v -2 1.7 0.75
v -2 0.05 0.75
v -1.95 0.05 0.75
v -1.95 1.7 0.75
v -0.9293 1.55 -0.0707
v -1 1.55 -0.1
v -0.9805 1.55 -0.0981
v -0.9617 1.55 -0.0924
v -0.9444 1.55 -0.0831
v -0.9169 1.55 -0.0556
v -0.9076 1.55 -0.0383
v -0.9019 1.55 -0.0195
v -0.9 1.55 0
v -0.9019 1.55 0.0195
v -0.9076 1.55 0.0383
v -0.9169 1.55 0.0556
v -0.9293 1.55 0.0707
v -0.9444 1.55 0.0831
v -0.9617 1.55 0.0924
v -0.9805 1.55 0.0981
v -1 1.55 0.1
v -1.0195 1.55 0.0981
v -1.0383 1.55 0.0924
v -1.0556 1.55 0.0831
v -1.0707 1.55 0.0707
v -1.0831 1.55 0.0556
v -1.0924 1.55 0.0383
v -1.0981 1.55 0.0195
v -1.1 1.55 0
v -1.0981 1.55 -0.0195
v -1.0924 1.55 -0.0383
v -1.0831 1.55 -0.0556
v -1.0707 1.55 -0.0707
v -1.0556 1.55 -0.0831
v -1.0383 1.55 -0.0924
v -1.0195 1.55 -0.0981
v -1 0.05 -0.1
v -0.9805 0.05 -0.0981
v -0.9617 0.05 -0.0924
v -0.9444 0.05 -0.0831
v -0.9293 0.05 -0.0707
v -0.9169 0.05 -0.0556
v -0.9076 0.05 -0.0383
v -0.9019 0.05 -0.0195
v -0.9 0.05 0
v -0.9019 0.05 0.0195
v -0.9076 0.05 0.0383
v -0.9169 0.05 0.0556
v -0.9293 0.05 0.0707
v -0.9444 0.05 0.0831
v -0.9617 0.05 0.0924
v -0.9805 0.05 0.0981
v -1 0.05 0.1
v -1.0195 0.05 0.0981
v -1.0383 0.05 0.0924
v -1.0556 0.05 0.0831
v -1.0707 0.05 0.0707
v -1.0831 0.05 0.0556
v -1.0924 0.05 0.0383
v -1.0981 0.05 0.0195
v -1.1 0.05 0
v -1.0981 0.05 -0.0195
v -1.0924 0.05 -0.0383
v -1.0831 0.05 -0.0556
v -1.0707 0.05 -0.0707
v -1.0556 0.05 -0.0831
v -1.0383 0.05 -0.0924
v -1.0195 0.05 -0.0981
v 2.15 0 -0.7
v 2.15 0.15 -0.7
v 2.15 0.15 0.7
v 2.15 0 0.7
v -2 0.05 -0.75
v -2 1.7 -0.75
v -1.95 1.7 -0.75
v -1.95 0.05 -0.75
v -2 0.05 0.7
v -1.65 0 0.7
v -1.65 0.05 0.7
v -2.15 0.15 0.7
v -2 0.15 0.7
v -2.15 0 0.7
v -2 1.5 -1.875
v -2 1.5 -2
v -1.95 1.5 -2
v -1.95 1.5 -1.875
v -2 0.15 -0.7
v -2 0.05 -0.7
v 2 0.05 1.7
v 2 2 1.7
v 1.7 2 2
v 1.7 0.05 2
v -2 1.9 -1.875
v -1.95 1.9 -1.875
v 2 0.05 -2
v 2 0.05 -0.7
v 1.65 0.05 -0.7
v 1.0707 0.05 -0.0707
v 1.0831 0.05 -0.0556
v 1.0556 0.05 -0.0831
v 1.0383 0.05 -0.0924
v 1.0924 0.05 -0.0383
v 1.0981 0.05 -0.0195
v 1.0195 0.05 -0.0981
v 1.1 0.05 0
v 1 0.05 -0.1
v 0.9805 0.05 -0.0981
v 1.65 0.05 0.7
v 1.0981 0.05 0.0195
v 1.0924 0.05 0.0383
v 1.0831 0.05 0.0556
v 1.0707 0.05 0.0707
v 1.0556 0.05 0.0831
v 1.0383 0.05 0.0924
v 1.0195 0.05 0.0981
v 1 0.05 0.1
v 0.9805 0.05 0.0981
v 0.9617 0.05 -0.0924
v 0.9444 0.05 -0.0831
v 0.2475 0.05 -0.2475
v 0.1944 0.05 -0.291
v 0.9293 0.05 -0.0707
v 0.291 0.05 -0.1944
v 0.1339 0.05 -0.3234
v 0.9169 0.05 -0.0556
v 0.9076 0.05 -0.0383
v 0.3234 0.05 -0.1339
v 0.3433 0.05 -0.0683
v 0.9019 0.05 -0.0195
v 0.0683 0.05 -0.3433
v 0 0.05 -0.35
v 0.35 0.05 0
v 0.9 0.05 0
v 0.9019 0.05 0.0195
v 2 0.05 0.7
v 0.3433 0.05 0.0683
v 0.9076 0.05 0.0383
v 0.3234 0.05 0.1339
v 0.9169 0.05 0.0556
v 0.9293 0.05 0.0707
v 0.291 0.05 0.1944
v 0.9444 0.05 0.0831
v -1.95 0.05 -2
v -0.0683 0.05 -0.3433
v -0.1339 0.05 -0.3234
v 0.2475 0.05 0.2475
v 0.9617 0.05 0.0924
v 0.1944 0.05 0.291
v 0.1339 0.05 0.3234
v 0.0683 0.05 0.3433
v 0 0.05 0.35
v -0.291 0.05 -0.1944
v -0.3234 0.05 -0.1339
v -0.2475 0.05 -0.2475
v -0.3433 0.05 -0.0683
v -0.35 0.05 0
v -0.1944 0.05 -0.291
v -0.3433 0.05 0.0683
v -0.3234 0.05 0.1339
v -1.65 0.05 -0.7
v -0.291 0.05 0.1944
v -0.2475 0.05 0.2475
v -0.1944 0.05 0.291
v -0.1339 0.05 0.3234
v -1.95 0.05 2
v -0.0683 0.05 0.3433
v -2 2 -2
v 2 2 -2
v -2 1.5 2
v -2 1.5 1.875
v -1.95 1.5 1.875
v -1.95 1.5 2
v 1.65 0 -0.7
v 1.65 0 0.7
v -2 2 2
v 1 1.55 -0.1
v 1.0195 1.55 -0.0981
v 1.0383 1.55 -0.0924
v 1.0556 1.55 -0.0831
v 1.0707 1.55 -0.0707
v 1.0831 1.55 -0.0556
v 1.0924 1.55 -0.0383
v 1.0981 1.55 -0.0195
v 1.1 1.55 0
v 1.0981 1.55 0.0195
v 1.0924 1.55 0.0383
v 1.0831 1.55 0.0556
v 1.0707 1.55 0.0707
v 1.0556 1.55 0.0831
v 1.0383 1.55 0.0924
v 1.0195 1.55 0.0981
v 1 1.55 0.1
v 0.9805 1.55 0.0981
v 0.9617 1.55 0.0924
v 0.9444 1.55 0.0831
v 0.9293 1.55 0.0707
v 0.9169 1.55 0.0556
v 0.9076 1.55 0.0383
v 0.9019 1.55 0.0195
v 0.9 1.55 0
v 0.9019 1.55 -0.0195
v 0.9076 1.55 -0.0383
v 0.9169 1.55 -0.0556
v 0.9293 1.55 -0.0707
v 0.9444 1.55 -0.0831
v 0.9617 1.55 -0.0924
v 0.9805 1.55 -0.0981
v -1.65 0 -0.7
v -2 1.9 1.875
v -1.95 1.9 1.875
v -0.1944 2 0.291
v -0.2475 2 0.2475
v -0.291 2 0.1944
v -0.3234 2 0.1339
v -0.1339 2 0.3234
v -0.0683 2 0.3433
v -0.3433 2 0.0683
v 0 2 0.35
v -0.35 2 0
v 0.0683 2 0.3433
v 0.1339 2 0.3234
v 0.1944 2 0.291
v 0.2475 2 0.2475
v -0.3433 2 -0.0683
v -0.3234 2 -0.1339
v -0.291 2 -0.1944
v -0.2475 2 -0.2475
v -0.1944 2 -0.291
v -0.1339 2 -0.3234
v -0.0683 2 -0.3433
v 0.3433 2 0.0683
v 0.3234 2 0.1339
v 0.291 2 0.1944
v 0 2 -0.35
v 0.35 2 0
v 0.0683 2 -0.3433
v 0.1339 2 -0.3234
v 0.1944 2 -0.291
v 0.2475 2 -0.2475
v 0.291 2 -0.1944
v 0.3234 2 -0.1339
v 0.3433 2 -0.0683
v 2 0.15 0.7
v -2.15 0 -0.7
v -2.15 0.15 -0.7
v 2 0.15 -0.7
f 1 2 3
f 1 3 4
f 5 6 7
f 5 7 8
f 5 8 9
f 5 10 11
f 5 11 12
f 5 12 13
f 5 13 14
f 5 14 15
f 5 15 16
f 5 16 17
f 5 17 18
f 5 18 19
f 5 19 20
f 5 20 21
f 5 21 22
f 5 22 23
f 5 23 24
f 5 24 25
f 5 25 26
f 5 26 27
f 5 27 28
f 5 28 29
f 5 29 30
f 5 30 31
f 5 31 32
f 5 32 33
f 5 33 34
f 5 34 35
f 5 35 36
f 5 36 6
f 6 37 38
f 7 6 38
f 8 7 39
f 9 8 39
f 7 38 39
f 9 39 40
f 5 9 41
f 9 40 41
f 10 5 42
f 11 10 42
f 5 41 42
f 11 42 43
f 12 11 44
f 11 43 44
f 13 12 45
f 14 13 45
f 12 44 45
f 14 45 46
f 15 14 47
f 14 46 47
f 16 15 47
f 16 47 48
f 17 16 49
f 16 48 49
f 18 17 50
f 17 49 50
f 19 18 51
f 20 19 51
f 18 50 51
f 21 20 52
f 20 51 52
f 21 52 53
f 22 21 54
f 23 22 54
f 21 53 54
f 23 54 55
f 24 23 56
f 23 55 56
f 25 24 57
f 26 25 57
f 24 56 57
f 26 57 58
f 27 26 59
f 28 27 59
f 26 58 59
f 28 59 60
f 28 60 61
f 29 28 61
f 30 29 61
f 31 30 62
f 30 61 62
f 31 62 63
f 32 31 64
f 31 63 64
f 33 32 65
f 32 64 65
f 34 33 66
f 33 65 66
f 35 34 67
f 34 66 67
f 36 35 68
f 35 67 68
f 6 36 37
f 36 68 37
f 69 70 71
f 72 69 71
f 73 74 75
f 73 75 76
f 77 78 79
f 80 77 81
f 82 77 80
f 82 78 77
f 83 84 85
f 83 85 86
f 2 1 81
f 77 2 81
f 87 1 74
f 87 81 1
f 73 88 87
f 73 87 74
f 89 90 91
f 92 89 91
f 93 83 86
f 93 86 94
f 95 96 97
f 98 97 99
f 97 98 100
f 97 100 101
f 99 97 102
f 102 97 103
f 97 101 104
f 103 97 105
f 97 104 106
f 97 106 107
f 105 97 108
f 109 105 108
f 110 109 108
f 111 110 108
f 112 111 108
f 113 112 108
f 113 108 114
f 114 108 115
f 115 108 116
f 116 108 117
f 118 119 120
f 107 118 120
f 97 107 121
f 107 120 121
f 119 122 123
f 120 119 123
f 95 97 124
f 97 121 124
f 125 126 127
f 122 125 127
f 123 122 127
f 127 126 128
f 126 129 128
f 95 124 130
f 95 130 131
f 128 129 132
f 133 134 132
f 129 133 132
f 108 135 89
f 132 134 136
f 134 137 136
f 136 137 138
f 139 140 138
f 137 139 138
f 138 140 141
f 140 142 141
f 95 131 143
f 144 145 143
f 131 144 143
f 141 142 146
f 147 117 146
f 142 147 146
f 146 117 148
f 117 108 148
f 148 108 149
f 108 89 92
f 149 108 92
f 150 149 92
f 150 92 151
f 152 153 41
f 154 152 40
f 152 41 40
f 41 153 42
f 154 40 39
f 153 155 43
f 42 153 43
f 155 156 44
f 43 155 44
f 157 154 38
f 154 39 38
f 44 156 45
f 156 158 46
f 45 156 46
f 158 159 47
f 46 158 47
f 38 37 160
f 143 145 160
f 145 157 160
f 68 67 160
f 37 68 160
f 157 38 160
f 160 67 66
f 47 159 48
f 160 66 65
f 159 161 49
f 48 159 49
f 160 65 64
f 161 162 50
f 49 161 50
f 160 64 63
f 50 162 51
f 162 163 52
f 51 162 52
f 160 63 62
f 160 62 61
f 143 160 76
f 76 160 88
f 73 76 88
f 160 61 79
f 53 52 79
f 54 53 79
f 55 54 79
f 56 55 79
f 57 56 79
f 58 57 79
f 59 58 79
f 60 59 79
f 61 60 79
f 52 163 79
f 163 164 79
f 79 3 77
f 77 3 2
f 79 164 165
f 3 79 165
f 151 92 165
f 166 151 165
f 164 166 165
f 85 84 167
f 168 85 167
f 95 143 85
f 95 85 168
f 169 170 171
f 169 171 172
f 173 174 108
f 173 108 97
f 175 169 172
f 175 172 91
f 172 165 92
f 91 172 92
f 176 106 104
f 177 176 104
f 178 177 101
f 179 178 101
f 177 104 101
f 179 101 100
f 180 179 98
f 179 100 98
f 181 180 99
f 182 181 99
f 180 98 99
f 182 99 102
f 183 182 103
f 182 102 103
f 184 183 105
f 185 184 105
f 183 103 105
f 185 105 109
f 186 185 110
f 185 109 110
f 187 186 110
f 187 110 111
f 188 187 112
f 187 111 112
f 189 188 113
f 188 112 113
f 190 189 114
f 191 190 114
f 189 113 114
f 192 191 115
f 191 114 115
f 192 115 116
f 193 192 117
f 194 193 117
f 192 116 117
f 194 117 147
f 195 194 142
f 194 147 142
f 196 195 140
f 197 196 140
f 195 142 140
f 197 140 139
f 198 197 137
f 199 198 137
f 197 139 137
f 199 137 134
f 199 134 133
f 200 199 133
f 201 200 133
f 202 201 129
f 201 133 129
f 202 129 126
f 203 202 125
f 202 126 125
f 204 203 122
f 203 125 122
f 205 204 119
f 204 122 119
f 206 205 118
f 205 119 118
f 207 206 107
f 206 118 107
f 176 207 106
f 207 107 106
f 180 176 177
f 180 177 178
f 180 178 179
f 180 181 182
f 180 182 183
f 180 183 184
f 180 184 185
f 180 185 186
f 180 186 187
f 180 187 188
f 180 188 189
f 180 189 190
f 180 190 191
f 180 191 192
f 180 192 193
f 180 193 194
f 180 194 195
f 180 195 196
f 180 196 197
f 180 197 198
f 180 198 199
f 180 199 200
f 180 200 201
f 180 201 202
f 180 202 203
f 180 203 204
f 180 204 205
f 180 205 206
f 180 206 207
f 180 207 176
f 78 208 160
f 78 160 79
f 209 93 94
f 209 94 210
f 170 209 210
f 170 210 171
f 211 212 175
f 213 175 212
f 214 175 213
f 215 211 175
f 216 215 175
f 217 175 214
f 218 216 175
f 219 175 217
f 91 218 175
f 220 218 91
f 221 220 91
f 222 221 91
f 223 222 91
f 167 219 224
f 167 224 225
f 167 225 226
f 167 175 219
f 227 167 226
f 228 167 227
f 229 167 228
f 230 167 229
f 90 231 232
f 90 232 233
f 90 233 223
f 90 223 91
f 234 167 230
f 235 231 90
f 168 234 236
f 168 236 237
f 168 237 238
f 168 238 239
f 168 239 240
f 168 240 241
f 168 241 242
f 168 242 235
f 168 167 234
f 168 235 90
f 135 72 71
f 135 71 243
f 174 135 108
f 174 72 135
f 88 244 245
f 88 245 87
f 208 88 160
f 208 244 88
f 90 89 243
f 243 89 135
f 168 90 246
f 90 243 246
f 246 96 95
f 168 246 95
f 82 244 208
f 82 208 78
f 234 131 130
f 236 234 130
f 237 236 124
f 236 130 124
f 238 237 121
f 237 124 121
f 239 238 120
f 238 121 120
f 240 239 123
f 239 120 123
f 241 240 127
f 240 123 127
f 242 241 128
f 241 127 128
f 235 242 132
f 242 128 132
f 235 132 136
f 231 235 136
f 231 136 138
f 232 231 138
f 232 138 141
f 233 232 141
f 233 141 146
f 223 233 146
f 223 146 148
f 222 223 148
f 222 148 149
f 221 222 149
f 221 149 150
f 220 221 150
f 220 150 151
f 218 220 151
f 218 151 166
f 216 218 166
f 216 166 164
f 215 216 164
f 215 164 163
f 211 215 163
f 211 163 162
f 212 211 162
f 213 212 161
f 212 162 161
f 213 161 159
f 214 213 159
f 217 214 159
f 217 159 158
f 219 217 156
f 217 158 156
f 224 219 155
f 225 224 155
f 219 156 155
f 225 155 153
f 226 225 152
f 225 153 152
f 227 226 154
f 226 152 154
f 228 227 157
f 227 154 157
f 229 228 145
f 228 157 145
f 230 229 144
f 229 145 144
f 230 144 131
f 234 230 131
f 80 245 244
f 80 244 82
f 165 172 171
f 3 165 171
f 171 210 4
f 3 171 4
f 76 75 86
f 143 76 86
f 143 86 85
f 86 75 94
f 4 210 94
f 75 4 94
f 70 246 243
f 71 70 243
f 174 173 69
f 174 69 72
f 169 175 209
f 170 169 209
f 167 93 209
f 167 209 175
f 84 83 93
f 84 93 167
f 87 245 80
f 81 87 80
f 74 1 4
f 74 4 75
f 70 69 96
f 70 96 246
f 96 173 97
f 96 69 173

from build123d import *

# Parameters (mm, degrees)
SKETCH1_W           = 4
SKETCH1_H           = 4
BOSS_EXTRUDE1_DEPTH = 2
CUT_EXTRUDE1_DEPTH  = 2
SKETCH3_W           = 1.4
SKETCH3_H           = 0.15
BOSS_EXTRUDE2_DEPTH = 2.15
SKETCH5_R           = 0.35
CUT_EXTRUDE4_DEPTH  = 2
CUT_EXTRUDE5_DEPTH  = 0.05
SKETCH8_R           = 0.1
CUT_EXTRUDE6_DEPTH  = 1.5
CUT_EXTRUDE7_DEPTH  = 0.05


with BuildPart() as part:
    # Sketch1 → Boss-Extrude1 (new body)
    with BuildSketch(Plane(origin=(0, 0, 0), x_dir=(1, 0, 0), z_dir=(0, 1, 0))):
        Rectangle(SKETCH1_W, SKETCH1_H)
    extrude(amount=BOSS_EXTRUDE1_DEPTH)

    # Sketch2 → Cut-Extrude1 (cut)
    with BuildSketch(Plane(origin=(0, 2, 0), x_dir=(1, 0, 0), z_dir=(0, 1, 0))):
        Polygon((2, -1.7), (1.7, -2), (2, -2), align=None)
    extrude(amount=-CUT_EXTRUDE1_DEPTH, mode=Mode.SUBTRACT)

    # Sketch3 → Boss-Extrude2 (add, symmetric)
    with BuildSketch(Plane.ZY):
        with Locations((0, 0.075)):
            Rectangle(SKETCH3_W, SKETCH3_H)
    extrude(amount=BOSS_EXTRUDE2_DEPTH, both=True)

    # Sketch5 → Cut-Extrude4 (cut)
    with BuildSketch(Plane(origin=(0, 0, 0), x_dir=(-1, 0, 0), z_dir=(0, -1, 0))):
        with Locations(Location((0, 0, 0), (0, 0, 90))):
            Circle(SKETCH5_R)
    extrude(amount=-CUT_EXTRUDE4_DEPTH, mode=Mode.SUBTRACT)

    # Sketch7 → Cut-Extrude5 (cut)
    with BuildSketch(Plane.XZ):
        Polygon((2, 0.7), (1.65, 0.7), (1.65, -0.7), (2, -0.7), (2, -2), (-2, -2), (-2, -0.7), (-1.65, -0.7), (-1.65, 0.7), (-2, 0.7), (-2, 2), (1.7, 2), (2, 1.7), align=None)
    extrude(amount=-CUT_EXTRUDE5_DEPTH, mode=Mode.SUBTRACT)

    # Sketch8 → Cut-Extrude6 (cut)
    with BuildSketch(Plane.XZ.offset(-0.05)):
        with Locations(Location((-1, 0, 0), (0, 0, 270))):
            Circle(SKETCH8_R)
        with Locations(Location((1, 0, 0), (0, 0, 270))):
            Circle(SKETCH8_R)
    extrude(amount=-CUT_EXTRUDE6_DEPTH, mode=Mode.SUBTRACT)

    # Sketch9 → Cut-Extrude7 (cut)
    with BuildSketch(Plane.ZY.offset(2)):
        Polygon((-2, 1.5), (-1.875, 1.5), (-1.875, 1.9), (1.875, 1.9), (1.875, 1.5), (2, 1.5), (2, 0.05), (0.75, 0.05), (0.75, 1.7), (-0.75, 1.7), (-0.75, 0.05), (-2, 0.05), align=None)
    extrude(amount=-CUT_EXTRUDE7_DEPTH, mode=Mode.SUBTRACT)


solid = part.part
